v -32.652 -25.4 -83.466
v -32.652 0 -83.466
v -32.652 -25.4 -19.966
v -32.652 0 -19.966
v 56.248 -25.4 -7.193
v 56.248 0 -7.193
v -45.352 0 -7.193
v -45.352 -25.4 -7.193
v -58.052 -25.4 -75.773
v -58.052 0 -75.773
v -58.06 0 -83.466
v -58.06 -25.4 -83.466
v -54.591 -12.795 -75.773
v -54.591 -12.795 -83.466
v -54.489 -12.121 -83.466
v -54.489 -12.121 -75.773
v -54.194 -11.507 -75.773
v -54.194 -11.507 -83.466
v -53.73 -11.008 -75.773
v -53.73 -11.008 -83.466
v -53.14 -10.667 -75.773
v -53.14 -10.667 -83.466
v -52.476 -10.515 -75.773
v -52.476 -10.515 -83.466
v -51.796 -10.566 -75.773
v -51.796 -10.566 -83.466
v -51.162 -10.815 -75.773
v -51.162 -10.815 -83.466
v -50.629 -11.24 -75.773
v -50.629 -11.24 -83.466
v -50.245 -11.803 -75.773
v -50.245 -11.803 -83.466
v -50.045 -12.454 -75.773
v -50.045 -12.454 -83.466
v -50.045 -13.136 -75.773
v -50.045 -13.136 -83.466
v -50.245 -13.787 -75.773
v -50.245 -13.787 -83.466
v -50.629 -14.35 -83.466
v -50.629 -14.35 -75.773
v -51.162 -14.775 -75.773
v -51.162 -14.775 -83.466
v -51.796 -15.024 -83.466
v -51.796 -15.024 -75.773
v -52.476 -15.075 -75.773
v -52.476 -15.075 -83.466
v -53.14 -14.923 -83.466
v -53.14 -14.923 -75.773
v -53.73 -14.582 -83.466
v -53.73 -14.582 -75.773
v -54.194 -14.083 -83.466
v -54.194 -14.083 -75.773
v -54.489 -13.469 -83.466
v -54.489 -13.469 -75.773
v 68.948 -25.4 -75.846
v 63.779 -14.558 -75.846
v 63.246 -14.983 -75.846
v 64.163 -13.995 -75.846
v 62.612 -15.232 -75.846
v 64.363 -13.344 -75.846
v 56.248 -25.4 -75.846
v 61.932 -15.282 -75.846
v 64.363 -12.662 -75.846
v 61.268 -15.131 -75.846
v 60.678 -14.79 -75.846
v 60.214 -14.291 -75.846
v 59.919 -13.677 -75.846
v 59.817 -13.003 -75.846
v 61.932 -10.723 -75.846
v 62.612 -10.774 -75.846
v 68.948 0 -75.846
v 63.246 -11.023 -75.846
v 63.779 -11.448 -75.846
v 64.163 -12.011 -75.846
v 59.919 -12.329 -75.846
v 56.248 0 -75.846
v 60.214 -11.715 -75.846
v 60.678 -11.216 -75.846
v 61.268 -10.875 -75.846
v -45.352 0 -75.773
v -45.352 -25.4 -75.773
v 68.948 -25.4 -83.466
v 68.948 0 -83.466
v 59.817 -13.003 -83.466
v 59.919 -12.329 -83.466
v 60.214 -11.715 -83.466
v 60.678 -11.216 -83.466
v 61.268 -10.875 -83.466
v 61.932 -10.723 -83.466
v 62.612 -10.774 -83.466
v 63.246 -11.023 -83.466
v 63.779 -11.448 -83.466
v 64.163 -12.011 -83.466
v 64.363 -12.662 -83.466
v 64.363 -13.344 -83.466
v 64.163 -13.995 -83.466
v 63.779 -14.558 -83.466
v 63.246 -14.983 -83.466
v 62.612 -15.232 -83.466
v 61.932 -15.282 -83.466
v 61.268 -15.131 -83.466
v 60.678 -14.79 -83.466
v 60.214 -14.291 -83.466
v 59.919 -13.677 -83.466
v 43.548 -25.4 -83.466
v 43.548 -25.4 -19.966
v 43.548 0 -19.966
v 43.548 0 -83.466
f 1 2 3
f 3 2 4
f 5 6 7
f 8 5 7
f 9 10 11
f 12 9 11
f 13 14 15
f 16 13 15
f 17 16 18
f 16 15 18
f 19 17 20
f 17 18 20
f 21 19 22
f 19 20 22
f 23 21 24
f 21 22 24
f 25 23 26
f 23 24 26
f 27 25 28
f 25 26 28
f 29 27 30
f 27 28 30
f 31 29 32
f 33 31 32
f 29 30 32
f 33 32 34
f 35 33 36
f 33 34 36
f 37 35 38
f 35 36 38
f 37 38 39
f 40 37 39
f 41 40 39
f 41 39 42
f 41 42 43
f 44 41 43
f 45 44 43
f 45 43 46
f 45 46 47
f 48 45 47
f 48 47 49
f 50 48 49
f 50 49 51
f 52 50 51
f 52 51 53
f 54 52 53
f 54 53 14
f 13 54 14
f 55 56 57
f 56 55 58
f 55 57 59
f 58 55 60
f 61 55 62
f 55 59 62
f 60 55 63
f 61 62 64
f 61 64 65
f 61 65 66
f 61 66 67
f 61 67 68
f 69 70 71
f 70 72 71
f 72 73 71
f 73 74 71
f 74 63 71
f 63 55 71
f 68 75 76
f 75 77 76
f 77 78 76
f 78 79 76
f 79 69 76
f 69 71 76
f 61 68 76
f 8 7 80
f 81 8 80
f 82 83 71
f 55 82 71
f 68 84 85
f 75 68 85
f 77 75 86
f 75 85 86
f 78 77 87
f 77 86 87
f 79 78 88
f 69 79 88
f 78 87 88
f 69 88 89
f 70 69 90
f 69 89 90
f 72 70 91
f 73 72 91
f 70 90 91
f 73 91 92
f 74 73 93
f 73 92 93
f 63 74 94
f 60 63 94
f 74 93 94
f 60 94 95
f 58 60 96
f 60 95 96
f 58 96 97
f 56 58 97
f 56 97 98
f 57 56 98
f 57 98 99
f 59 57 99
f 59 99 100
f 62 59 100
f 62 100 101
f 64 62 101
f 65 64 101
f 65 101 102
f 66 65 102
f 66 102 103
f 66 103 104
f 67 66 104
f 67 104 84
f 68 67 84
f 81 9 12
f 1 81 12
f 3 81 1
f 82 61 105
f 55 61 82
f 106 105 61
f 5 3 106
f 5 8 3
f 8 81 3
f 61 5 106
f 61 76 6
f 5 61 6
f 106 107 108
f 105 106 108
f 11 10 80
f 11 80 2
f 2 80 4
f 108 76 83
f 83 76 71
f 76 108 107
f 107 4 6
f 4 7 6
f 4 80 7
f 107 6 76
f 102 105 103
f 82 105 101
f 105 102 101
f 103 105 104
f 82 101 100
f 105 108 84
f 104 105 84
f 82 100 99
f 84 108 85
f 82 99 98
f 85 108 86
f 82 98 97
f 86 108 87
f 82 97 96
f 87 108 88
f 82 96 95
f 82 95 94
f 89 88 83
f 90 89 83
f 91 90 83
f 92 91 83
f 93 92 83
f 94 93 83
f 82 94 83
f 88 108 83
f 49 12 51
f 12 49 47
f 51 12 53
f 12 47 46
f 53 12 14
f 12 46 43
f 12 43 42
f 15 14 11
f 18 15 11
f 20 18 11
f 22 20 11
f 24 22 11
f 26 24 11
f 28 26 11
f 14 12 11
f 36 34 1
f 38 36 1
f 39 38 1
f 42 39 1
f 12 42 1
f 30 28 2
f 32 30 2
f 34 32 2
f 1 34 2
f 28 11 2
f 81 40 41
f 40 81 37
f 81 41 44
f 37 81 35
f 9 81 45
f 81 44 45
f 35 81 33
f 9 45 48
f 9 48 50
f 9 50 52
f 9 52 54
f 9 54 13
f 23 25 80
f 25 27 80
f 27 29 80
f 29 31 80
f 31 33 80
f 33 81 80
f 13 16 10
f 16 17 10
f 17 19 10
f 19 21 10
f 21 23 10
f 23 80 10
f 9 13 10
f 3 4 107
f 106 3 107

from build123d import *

# Parameters (mm, degrees)
F1_DEPTH = 25.4
F3_D     = 4.572
F5_D     = 4.572


with BuildPart() as f1:
    # F0 (on Front) → F1 (new body)
    with BuildSketch(Plane.XZ):
        Polygon((-45.351734, -7.193425), (-45.351734, -75.773425), (-58.051734, -75.773425), (-58.059905, -83.466448), (-32.651734, -83.466448), (-32.651734, -19.966448), (43.548266, -19.966448), (43.548266, -83.466448), (68.948266, -83.466448), (68.948266, -75.846448), (56.248266, -75.846448), (56.248266, -7.193425), align=None)
    extrude(amount=F1_DEPTH)

    # F3 (through all)
    with Locations(Plane.XY):
        with Locations((-52.30502, -12.795078)):
            Hole(F3_D / 2)

    # F5 (through all)
    with Locations(Plane.XY):
        with Locations((62.102944, -13.002886)):
            Hole(F5_D / 2)


solid = f1.part
